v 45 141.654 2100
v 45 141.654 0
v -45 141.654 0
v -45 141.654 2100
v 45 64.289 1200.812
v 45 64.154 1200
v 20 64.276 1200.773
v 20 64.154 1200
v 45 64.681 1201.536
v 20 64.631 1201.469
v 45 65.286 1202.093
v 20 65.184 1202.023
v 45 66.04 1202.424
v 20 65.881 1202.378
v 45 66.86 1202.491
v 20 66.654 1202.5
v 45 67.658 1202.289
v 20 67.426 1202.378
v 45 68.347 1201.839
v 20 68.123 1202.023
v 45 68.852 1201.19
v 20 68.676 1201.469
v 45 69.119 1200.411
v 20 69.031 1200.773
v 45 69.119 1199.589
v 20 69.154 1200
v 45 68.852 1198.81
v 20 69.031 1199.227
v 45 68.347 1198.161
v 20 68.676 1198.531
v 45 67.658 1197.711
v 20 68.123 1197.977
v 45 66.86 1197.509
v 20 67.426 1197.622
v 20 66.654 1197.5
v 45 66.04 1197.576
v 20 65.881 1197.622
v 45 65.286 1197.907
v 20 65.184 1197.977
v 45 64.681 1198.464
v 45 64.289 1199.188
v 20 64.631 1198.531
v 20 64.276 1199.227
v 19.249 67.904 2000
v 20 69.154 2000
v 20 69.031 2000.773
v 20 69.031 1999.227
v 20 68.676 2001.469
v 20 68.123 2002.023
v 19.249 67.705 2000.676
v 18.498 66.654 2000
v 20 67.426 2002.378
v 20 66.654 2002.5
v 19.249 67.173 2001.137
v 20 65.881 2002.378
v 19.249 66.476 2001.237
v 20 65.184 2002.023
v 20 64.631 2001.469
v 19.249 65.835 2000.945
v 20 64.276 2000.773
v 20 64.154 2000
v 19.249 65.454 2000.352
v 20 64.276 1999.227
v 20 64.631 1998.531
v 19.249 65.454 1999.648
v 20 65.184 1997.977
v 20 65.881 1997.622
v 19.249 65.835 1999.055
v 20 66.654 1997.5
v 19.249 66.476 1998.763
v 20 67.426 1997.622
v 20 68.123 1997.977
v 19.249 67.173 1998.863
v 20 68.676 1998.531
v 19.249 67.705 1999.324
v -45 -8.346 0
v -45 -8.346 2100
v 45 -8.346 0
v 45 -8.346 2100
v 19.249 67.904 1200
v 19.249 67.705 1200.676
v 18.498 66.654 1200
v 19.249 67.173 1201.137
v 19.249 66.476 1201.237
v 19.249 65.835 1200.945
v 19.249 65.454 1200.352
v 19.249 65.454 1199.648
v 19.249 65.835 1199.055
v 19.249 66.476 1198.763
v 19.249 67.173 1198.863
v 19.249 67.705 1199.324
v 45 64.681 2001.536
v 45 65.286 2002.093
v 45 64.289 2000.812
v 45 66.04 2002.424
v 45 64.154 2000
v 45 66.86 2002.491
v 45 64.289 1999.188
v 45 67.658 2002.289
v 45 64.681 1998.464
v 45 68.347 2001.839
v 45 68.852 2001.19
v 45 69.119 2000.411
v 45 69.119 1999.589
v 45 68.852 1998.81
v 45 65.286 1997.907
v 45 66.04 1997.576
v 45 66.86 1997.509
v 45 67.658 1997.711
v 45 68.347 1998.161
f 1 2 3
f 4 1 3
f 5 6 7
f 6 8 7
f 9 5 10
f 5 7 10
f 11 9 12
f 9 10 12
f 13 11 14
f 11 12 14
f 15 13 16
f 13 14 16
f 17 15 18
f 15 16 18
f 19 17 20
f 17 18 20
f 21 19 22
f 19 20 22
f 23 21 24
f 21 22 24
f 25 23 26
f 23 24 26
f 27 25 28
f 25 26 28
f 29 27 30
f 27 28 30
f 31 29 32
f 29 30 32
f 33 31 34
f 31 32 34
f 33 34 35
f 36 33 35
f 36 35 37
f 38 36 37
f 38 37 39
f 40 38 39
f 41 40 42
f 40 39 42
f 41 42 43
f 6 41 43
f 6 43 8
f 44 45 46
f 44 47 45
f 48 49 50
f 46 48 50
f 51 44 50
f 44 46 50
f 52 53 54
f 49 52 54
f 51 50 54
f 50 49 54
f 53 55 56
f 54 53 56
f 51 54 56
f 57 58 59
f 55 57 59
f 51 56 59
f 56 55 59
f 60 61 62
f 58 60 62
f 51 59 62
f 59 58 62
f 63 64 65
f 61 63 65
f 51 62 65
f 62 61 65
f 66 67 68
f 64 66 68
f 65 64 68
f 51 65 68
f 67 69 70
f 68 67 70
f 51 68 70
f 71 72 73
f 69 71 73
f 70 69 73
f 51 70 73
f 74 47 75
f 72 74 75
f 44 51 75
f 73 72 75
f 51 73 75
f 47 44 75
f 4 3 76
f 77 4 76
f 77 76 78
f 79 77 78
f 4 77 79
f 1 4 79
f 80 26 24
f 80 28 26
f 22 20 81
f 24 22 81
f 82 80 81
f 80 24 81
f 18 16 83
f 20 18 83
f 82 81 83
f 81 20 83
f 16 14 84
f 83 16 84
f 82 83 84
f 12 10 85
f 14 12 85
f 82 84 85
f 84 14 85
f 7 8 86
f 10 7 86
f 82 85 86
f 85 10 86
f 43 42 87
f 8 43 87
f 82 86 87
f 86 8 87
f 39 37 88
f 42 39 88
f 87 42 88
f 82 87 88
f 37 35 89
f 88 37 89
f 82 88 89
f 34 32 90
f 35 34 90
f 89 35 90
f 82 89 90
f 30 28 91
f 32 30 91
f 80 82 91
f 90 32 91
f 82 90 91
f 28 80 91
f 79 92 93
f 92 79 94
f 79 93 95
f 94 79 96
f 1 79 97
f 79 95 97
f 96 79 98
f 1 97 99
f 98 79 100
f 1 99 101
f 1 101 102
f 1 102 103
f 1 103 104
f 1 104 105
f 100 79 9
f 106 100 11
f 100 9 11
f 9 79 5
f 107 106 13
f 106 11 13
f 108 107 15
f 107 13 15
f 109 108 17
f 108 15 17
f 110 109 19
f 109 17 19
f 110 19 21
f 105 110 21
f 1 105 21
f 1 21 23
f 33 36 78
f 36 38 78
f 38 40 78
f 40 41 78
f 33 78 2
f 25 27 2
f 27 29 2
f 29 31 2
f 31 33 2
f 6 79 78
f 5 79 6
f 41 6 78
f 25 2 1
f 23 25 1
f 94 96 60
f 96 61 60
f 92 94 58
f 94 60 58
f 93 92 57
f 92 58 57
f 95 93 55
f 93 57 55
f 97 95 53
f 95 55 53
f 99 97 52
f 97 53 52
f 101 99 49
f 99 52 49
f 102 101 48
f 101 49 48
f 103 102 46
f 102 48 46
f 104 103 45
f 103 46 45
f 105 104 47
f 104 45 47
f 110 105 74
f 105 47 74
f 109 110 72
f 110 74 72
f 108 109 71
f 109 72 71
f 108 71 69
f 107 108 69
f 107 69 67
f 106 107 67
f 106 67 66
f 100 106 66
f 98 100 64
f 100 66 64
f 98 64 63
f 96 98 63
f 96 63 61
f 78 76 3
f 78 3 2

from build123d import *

# Parameters (mm, degrees)
F1_DEPTH = 2100
F3_D     = 5
F3_DEPTH = 25
F3_TIP   = 1.5021515476
F4_D     = 5
F4_DEPTH = 25
F4_TIP   = 1.5021515476


with BuildPart() as f1:
    # F0 (on Top) → F1 (new body)
    with BuildSketch(Plane.XY):
        Polygon((-34.2555230263, 141.6535690603), (-45, 141.6535690603), (-45, -8.3464309397), (45, -8.3464309397), (45, 141.6535690603), (34.2555230263, 141.6535690603), align=None)
    extrude(amount=F1_DEPTH)

    # F3
    with Locations(Plane.YZ.offset(45)):
        with Locations((66.6535690603, 1200)):
            Hole(F3_D / 2, depth=F3_DEPTH)
            with Locations((0, 0, -(F3_DEPTH + F3_TIP / 2))):  # 118° drill point
                Cone(0, F3_D / 2, F3_TIP, mode=Mode.SUBTRACT)

    # F4
    with Locations(Plane.YZ.offset(45)):
        with Locations((66.6535690603, 2000)):
            Hole(F4_D / 2, depth=F4_DEPTH)
            with Locations((0, 0, -(F4_DEPTH + F4_TIP / 2))):  # 118° drill point
                Cone(0, F4_D / 2, F4_TIP, mode=Mode.SUBTRACT)


solid = f1.part
